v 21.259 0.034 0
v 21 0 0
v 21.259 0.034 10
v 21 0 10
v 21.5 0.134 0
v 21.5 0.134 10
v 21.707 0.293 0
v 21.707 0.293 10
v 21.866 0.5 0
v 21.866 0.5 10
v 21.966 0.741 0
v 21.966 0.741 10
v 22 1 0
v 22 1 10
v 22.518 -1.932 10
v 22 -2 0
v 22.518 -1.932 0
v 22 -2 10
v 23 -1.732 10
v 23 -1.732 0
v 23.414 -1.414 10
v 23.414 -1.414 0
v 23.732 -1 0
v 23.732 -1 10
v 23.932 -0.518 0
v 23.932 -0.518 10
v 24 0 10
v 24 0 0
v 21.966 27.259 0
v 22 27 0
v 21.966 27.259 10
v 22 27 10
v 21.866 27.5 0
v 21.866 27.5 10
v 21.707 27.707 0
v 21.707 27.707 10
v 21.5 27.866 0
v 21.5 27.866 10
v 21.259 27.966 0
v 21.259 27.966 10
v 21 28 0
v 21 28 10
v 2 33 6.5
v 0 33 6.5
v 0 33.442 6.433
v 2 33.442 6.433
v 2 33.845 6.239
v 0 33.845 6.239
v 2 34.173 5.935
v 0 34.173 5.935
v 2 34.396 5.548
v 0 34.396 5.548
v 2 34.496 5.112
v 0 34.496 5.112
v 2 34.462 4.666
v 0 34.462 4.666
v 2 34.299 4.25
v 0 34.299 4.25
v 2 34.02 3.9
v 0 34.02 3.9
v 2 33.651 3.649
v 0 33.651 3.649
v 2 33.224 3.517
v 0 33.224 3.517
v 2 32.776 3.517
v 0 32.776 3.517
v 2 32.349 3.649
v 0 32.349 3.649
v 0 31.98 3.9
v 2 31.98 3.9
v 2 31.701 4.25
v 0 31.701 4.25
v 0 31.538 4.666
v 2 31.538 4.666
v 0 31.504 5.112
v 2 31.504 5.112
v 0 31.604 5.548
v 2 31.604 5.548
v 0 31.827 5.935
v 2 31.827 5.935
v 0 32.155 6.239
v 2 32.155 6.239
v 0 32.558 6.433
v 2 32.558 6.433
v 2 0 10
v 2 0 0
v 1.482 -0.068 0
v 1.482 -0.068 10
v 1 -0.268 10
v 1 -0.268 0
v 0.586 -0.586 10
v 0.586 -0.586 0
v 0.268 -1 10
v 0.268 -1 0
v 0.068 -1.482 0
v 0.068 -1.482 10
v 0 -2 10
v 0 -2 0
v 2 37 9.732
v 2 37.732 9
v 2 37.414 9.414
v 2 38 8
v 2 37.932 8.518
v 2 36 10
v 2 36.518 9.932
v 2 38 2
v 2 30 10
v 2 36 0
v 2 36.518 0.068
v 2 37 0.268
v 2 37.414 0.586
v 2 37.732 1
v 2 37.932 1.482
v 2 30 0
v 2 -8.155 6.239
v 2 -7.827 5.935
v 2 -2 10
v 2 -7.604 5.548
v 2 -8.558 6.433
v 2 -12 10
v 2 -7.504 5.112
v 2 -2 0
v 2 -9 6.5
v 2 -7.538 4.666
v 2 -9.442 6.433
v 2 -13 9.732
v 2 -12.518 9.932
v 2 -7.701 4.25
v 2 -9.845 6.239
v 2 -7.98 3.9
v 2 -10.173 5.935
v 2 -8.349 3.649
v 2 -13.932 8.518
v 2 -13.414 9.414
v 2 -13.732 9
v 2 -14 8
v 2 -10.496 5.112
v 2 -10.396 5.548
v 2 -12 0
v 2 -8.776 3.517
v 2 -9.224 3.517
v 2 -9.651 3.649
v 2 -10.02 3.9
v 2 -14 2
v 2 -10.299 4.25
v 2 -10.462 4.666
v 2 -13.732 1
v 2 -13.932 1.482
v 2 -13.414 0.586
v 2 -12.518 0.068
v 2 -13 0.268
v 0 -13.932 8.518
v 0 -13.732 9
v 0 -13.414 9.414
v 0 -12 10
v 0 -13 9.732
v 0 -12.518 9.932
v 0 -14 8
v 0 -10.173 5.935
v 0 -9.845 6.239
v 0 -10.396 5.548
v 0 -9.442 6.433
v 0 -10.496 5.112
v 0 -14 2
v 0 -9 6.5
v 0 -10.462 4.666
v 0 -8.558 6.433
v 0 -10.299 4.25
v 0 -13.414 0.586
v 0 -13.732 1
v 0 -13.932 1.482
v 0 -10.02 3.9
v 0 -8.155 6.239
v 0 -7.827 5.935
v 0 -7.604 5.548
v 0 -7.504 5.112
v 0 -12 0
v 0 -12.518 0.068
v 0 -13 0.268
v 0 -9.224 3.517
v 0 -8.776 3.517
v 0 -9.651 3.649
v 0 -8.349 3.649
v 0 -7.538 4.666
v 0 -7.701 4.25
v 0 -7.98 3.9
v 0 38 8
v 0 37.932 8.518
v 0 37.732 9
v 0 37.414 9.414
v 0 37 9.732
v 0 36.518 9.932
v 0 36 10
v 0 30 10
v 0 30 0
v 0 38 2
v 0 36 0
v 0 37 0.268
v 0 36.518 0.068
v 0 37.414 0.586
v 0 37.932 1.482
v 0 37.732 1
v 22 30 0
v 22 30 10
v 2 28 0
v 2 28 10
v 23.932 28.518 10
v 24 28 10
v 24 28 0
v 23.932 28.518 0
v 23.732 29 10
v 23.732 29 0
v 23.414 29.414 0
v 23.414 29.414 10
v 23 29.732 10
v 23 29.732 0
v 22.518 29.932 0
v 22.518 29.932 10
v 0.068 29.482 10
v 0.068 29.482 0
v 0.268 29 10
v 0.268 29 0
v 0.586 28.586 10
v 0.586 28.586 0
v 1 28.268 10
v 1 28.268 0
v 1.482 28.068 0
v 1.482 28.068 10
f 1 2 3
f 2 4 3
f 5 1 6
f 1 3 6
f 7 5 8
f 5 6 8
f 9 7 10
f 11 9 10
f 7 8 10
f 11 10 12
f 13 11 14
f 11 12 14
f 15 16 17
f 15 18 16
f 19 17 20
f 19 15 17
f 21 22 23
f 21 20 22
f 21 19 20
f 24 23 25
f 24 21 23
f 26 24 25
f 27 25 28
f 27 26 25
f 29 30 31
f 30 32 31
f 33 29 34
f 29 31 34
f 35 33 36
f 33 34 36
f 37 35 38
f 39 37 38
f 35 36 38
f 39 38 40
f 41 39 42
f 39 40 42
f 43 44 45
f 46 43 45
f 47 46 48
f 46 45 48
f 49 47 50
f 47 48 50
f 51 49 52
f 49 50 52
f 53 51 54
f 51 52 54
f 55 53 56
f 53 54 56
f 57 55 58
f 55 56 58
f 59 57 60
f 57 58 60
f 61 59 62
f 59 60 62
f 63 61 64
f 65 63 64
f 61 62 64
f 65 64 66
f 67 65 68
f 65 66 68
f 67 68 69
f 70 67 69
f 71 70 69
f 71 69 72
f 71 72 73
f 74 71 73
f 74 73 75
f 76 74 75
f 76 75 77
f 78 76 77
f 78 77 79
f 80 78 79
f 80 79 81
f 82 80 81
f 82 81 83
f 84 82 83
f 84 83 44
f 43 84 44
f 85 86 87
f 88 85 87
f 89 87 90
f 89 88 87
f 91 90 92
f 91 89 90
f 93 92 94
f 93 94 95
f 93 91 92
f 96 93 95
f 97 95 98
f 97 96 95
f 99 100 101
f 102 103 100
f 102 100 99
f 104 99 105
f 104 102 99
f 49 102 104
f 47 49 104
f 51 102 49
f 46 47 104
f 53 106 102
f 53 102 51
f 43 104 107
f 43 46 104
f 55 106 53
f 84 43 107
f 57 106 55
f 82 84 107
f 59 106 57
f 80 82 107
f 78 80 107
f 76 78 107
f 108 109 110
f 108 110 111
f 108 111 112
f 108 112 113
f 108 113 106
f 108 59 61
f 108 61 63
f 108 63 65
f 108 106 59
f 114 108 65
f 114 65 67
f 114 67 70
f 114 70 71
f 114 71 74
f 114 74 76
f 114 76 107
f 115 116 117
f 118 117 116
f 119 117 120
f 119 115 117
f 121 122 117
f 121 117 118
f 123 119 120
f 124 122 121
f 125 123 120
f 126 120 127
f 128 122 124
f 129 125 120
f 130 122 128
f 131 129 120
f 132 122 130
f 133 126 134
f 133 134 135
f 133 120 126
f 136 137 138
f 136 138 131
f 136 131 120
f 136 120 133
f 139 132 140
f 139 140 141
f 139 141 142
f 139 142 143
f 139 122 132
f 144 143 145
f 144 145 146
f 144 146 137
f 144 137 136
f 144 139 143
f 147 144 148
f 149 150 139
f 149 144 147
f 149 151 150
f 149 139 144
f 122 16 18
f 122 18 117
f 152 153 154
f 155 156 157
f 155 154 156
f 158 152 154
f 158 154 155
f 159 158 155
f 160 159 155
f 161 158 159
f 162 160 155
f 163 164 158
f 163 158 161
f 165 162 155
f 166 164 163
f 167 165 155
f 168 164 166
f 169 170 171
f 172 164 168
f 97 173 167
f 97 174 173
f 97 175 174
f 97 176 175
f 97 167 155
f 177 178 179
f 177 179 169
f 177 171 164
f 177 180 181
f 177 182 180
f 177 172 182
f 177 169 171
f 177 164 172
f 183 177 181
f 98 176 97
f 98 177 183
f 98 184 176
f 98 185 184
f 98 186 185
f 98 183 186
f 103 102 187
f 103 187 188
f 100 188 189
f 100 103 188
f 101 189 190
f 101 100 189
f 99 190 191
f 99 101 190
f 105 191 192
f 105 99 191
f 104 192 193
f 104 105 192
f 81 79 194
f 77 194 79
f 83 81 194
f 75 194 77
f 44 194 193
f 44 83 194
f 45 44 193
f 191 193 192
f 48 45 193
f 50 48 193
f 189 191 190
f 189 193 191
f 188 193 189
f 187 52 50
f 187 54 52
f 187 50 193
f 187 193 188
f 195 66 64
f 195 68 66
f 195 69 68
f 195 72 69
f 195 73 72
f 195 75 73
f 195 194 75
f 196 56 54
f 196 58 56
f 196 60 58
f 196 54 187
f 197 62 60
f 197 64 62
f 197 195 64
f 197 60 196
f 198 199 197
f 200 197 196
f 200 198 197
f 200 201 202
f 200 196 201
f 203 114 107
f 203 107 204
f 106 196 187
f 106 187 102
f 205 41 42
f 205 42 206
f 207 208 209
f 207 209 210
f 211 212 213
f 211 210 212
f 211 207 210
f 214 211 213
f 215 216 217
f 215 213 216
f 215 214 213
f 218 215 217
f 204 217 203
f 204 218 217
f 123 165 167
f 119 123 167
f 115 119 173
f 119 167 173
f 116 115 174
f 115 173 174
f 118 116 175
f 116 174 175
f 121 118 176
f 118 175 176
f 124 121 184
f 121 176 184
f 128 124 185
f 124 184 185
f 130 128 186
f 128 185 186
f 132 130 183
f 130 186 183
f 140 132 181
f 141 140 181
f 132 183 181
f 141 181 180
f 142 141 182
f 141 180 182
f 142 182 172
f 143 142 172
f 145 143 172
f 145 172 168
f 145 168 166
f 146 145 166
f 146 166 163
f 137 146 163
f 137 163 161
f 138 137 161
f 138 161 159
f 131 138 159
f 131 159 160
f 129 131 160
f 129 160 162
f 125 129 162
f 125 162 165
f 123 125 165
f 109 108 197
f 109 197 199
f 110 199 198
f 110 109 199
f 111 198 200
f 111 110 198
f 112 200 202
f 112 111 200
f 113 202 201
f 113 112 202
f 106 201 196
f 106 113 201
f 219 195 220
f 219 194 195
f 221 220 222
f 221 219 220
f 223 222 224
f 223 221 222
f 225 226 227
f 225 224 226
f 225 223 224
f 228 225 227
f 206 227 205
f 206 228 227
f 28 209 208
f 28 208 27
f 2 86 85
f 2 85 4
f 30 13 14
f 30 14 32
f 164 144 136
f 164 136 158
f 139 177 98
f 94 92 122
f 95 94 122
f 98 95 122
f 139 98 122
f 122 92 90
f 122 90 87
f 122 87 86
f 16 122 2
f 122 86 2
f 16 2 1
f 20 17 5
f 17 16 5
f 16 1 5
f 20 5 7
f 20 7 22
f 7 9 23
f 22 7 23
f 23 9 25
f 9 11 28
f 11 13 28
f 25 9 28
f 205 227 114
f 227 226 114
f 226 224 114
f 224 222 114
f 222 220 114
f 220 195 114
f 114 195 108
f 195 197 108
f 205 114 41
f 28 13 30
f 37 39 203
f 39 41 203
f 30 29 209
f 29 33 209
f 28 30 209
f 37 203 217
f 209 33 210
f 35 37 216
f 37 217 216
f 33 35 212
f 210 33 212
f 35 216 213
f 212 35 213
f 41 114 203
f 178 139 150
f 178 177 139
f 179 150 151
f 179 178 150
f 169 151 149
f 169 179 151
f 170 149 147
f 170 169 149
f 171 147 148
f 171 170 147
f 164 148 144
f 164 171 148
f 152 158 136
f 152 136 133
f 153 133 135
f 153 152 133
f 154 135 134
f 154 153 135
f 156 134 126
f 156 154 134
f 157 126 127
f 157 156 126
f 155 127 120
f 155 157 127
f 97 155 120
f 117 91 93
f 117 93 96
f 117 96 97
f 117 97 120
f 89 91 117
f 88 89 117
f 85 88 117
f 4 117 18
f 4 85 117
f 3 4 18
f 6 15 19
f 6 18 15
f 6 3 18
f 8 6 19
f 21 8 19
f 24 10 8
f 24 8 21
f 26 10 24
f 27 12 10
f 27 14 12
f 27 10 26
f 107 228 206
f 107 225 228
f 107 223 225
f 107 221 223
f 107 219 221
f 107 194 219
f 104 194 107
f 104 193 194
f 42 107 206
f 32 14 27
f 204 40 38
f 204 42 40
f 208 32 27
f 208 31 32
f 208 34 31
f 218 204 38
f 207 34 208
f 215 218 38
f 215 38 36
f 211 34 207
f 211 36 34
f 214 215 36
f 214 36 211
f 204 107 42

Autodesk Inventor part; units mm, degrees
ref_plane "YZ Plane" through (0, 0, 0) normal (1, 0, 0) x (0, 1, 0)
ref_plane "XZ Plane" through (0, 0, 0) normal (0, 1, 0) x (-1, 0, 0)
ref_plane "XY Plane" through (0, 0, 0) normal (0, 0, 1) x (1, 0, 0)
sketch "Skizze1" plane through (0, 0, 0) normal (0, 0, 1) x (1, 0, 0)
  line L0 (0, 0) -> (22, 0)
  line L1 (22, 0) -> (22, 28)
  line L2 (22, 28) -> (0, 28)
  line L3 (0, 28) -> (0, 38)
  line L4 (0, 38) -> (2, 38)
  line L5 (2, 38) -> (2, 30)
  line L6 (2, 30) -> (24, 30)
  line L7 (24, 30) -> (24, -2)
  line L8 (24, -2) -> (2, -2)
  line L9 (2, -2) -> (2, -14)
  line L10 (2, -14) -> (0, -14)
  line L11 (0, -14) -> (0, 0)
  line L12 (22, 0) -> (22, -2) construction
  line L13 (22, 28) -> (22, 30) construction
  dimension "d1" = 14
  dimension "d3" = 2
  dimension "d4" = 20
  dimension "d5" = 2
  dimension "d6" = 28
  dimension "d7" = 2
  dimension "d17" = 10
extrude "Extrusion1" add sketch "Skizze1" along normal blind 10
fillet "Rundung1" radius 2 4 edges at (0, 28, 5) (0, 0, 5) (24, 30, 5) (24, -2, 5)
fillet "Rundung2" radius 2 4 edges at (1, -14, 10) (1, -14, 0) (1, 38, 10) (1, 38, 0)
sketch "Skizze2" plane through (0, 30, 0) normal (-1, 0, 0) x (0, 0, 1)
  line L0 (2, 8) -> (8, 8) construction
  line L1 (5, 8) -> (5, -2) construction
  line L2 (0, -2) -> (10, -2) construction
  circle A0 centre (5, 3) radius 1.5
  line L3 (10, -2) -> (10, -30) construction
  line L4 (0, -2) -> (0, -30) construction
  circle A1 centre (5, -39) radius 1.5
  line L5 (0, -32) -> (10, -32) projected
  point P0 (10, -4)
  point P1 (10, -28)
  point P2 (0, -4)
  point P3 (0, -28)
  point P4 (0, 0)
  dimension "d12" = 3
  dimension "d15" = 3
  dimension "d18" = 7
extrude "Extrusion2" cut sketch "Skizze2" against normal up to next
fillet "Rundung3" radius 1 2 edges at (22, 28, 5) (22, 0, 5)
properties part number "Akkuhalterung" material "ABS-Kunststoff"
